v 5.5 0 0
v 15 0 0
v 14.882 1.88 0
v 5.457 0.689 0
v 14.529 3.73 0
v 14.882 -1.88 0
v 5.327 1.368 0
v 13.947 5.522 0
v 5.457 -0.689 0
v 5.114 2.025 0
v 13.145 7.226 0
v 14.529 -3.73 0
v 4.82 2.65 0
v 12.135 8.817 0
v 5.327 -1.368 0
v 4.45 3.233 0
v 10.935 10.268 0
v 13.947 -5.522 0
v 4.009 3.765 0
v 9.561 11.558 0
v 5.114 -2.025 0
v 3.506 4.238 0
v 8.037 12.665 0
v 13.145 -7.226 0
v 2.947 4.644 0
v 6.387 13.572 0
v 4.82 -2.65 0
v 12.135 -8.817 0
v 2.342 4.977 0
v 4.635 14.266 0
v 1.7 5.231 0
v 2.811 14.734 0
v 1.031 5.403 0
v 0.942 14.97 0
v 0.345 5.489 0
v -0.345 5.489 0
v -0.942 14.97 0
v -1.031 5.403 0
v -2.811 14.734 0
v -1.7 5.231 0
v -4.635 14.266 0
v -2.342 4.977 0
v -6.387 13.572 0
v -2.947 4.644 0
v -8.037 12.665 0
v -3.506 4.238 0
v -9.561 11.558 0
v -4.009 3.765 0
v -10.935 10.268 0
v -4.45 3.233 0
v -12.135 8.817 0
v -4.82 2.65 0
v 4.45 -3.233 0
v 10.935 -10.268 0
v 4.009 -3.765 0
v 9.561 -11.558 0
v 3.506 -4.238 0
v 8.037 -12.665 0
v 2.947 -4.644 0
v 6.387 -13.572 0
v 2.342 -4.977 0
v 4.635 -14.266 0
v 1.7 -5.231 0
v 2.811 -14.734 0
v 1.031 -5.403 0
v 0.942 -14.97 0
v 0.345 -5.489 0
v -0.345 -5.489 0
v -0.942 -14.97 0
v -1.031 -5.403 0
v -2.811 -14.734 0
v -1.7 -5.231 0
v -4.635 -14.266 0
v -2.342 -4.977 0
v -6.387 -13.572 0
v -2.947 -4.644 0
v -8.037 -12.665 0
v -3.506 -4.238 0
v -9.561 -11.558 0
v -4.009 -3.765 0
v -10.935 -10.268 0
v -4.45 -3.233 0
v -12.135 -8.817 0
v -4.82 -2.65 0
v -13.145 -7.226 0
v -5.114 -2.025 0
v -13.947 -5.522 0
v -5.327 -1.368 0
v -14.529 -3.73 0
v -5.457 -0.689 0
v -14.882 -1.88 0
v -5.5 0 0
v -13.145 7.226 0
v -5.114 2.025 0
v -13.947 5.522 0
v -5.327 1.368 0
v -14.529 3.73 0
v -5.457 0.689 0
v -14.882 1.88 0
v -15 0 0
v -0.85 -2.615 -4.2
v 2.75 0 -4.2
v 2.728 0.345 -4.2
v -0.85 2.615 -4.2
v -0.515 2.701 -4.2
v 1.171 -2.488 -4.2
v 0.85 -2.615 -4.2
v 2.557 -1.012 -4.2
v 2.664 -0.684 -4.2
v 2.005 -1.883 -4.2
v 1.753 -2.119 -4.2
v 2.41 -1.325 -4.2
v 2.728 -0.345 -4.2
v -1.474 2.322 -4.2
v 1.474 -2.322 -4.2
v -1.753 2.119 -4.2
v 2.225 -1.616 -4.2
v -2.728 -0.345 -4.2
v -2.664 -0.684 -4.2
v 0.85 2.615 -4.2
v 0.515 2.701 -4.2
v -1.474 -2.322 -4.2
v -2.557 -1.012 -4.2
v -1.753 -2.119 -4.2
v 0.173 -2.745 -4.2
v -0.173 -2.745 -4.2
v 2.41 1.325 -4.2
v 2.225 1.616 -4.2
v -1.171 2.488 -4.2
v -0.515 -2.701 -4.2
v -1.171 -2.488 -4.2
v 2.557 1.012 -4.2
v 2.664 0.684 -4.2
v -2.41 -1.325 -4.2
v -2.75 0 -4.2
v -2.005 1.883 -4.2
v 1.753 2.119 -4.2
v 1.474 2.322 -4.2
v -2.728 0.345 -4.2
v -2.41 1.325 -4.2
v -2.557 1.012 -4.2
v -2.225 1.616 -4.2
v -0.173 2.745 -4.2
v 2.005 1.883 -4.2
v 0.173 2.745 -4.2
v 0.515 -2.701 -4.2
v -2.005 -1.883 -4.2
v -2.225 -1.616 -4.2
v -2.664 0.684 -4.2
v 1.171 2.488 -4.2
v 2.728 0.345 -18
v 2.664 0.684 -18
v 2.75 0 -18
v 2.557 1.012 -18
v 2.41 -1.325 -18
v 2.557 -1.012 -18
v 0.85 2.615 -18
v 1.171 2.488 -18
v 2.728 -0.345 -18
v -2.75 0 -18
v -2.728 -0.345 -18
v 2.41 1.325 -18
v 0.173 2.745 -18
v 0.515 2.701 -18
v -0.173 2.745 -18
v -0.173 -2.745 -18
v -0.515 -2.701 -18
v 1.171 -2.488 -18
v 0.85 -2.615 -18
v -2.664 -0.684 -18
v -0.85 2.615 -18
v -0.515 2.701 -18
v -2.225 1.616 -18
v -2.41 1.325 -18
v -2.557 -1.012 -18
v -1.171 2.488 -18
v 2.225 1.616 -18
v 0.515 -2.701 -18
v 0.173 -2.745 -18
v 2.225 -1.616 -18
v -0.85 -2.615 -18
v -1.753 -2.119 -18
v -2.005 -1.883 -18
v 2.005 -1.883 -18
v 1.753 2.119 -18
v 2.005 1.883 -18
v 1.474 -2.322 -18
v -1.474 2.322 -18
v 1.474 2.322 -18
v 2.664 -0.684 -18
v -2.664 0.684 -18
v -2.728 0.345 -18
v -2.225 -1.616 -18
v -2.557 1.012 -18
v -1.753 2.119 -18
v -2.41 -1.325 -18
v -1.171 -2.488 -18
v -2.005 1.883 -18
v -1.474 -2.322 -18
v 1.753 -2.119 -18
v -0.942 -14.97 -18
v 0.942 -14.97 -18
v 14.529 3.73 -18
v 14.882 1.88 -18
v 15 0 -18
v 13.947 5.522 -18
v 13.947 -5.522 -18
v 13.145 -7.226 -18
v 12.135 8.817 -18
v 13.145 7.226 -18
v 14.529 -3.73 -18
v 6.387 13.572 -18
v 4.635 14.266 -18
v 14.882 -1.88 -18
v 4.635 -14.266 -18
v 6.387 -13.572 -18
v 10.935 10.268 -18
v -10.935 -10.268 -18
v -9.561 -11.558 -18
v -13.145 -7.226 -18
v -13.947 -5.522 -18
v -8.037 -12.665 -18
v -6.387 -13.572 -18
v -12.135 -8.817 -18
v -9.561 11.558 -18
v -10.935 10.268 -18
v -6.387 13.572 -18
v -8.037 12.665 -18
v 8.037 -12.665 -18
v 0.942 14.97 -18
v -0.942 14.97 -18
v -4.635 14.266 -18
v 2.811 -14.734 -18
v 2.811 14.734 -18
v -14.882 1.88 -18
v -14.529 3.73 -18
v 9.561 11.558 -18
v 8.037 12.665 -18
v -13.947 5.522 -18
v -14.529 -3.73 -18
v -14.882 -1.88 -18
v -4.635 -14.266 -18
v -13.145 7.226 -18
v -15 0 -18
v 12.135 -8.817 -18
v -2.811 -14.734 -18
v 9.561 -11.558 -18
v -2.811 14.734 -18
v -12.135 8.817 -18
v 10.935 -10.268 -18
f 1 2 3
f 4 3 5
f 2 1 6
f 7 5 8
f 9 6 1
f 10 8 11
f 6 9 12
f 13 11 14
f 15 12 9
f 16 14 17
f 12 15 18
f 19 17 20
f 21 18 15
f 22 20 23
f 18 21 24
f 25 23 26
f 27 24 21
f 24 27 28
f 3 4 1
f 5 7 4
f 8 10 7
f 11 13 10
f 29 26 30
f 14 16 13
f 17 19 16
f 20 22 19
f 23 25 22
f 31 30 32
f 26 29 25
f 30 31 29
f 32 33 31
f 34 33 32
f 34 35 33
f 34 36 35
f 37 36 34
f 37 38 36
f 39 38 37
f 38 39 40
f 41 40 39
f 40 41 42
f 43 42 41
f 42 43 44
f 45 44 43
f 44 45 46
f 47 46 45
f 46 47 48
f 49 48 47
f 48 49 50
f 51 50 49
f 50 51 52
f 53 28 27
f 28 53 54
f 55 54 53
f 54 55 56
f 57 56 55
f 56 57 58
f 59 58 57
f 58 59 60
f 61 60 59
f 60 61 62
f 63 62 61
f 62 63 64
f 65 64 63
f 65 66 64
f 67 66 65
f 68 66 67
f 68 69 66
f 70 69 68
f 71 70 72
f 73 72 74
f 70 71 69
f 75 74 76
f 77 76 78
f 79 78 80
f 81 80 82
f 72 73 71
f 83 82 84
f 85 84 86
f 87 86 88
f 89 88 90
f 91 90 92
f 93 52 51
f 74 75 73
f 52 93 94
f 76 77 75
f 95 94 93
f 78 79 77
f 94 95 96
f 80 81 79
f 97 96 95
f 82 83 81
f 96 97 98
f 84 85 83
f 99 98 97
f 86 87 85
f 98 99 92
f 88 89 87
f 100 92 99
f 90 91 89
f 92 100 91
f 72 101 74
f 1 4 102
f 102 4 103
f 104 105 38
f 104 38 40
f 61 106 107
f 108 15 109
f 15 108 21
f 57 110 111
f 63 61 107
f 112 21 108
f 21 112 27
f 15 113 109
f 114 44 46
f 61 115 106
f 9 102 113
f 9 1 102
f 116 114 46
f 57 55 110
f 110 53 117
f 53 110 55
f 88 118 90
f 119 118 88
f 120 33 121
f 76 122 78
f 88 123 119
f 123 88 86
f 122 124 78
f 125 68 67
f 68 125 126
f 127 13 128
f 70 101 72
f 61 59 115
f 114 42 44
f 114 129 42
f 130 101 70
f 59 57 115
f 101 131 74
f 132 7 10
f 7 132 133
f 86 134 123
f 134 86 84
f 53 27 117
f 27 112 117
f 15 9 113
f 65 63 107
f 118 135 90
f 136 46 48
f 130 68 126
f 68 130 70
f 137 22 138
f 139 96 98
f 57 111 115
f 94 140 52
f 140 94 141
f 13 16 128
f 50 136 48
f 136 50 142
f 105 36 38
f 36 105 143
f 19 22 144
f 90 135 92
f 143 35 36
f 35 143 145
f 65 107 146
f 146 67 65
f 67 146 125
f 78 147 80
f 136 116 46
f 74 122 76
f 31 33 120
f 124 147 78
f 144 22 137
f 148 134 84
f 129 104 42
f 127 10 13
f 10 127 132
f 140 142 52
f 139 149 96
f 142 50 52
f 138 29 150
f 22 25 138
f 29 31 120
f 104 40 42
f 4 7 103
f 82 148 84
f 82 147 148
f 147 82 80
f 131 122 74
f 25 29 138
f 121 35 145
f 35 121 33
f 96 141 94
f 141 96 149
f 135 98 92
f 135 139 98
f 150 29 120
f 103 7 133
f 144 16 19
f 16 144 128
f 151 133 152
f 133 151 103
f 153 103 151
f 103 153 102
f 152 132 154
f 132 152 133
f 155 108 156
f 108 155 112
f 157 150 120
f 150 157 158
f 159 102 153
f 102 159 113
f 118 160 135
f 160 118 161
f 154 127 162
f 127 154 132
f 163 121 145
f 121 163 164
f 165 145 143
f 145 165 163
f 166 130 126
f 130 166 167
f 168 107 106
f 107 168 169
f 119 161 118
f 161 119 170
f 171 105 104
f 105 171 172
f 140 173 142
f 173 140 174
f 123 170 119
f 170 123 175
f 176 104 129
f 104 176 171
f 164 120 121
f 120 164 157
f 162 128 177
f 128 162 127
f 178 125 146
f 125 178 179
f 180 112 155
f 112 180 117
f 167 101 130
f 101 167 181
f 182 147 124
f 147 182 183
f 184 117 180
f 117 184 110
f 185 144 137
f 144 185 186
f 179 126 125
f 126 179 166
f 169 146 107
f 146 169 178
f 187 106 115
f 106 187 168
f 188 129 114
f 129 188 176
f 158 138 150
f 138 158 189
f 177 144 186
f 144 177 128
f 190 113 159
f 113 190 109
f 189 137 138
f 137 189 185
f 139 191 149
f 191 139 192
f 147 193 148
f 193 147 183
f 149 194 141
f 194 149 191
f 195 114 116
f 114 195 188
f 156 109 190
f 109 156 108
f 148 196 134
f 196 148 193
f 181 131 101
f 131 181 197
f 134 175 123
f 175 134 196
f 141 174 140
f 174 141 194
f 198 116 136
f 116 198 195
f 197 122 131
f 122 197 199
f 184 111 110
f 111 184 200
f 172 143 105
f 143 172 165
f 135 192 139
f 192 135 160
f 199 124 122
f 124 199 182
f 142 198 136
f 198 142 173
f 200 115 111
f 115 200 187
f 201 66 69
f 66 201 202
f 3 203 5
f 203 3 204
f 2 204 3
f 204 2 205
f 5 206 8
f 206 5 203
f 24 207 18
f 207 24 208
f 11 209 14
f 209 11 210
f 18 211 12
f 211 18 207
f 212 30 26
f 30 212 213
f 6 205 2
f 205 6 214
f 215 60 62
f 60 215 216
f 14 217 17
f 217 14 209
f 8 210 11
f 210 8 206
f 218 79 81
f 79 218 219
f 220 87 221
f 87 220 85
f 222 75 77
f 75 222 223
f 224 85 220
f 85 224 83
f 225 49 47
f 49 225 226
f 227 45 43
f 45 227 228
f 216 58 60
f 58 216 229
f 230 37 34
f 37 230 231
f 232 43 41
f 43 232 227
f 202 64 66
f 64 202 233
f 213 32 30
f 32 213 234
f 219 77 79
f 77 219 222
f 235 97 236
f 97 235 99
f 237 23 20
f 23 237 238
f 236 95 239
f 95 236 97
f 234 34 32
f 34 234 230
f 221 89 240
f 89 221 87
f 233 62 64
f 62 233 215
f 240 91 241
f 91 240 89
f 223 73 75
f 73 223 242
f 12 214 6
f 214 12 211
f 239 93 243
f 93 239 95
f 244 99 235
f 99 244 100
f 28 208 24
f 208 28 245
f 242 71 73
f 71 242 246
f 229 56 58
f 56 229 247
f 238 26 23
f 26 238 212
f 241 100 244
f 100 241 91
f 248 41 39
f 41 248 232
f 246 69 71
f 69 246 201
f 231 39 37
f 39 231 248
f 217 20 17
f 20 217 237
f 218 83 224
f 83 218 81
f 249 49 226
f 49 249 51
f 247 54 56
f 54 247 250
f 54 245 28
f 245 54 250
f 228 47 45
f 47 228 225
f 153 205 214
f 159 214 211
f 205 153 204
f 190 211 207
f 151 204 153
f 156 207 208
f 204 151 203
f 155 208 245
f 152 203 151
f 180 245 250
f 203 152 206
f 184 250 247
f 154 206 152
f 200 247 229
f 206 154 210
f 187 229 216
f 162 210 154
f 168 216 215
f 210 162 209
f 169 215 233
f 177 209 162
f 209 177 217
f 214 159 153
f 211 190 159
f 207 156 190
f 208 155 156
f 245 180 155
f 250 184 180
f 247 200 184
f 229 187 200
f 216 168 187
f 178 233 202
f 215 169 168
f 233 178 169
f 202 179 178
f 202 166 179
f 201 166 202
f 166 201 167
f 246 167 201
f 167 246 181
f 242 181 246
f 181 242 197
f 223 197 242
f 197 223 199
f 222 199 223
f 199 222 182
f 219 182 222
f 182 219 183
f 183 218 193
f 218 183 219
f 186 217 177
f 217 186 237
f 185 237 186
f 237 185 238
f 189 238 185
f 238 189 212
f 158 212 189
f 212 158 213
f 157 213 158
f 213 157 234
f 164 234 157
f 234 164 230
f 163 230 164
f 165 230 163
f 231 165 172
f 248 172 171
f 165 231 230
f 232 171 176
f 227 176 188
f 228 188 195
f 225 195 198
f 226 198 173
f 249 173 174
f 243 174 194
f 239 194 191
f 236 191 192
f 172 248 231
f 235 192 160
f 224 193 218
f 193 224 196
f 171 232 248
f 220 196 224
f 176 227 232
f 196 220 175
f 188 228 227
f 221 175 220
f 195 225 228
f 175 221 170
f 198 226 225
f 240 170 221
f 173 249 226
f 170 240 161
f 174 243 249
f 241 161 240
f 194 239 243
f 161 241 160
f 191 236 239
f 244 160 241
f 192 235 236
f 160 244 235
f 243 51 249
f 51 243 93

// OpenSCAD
$fn = 50;


difference() {
	union() {
		translate(v = [0, 0, -18.0000000000]) {
			cylinder(h = 18, r = 15.0000000000);
		}
	}
	union() {
		translate(v = [0, 0, 0]) {
			rotate(a = [0, 0, 0]) {
				difference() {
					union() {
						translate(v = [0, 0, -21.0000000000]) {
							cylinder(h = 21, r = 2.2500000000);
						}
						translate(v = [0, 0, -4.2000000000]) {
							cylinder(h = 4.2000000000, r1 = 2.7500000000, r2 = 5.5000000000);
						}
						translate(v = [0, 0, -21.0000000000]) {
							cylinder(h = 21, r = 2.7500000000);
						}
						translate(v = [0, 0, -21.0000000000]) {
							cylinder(h = 21, r = 2.2500000000);
						}
					}
					union();
				}
			}
		}
	}
}
